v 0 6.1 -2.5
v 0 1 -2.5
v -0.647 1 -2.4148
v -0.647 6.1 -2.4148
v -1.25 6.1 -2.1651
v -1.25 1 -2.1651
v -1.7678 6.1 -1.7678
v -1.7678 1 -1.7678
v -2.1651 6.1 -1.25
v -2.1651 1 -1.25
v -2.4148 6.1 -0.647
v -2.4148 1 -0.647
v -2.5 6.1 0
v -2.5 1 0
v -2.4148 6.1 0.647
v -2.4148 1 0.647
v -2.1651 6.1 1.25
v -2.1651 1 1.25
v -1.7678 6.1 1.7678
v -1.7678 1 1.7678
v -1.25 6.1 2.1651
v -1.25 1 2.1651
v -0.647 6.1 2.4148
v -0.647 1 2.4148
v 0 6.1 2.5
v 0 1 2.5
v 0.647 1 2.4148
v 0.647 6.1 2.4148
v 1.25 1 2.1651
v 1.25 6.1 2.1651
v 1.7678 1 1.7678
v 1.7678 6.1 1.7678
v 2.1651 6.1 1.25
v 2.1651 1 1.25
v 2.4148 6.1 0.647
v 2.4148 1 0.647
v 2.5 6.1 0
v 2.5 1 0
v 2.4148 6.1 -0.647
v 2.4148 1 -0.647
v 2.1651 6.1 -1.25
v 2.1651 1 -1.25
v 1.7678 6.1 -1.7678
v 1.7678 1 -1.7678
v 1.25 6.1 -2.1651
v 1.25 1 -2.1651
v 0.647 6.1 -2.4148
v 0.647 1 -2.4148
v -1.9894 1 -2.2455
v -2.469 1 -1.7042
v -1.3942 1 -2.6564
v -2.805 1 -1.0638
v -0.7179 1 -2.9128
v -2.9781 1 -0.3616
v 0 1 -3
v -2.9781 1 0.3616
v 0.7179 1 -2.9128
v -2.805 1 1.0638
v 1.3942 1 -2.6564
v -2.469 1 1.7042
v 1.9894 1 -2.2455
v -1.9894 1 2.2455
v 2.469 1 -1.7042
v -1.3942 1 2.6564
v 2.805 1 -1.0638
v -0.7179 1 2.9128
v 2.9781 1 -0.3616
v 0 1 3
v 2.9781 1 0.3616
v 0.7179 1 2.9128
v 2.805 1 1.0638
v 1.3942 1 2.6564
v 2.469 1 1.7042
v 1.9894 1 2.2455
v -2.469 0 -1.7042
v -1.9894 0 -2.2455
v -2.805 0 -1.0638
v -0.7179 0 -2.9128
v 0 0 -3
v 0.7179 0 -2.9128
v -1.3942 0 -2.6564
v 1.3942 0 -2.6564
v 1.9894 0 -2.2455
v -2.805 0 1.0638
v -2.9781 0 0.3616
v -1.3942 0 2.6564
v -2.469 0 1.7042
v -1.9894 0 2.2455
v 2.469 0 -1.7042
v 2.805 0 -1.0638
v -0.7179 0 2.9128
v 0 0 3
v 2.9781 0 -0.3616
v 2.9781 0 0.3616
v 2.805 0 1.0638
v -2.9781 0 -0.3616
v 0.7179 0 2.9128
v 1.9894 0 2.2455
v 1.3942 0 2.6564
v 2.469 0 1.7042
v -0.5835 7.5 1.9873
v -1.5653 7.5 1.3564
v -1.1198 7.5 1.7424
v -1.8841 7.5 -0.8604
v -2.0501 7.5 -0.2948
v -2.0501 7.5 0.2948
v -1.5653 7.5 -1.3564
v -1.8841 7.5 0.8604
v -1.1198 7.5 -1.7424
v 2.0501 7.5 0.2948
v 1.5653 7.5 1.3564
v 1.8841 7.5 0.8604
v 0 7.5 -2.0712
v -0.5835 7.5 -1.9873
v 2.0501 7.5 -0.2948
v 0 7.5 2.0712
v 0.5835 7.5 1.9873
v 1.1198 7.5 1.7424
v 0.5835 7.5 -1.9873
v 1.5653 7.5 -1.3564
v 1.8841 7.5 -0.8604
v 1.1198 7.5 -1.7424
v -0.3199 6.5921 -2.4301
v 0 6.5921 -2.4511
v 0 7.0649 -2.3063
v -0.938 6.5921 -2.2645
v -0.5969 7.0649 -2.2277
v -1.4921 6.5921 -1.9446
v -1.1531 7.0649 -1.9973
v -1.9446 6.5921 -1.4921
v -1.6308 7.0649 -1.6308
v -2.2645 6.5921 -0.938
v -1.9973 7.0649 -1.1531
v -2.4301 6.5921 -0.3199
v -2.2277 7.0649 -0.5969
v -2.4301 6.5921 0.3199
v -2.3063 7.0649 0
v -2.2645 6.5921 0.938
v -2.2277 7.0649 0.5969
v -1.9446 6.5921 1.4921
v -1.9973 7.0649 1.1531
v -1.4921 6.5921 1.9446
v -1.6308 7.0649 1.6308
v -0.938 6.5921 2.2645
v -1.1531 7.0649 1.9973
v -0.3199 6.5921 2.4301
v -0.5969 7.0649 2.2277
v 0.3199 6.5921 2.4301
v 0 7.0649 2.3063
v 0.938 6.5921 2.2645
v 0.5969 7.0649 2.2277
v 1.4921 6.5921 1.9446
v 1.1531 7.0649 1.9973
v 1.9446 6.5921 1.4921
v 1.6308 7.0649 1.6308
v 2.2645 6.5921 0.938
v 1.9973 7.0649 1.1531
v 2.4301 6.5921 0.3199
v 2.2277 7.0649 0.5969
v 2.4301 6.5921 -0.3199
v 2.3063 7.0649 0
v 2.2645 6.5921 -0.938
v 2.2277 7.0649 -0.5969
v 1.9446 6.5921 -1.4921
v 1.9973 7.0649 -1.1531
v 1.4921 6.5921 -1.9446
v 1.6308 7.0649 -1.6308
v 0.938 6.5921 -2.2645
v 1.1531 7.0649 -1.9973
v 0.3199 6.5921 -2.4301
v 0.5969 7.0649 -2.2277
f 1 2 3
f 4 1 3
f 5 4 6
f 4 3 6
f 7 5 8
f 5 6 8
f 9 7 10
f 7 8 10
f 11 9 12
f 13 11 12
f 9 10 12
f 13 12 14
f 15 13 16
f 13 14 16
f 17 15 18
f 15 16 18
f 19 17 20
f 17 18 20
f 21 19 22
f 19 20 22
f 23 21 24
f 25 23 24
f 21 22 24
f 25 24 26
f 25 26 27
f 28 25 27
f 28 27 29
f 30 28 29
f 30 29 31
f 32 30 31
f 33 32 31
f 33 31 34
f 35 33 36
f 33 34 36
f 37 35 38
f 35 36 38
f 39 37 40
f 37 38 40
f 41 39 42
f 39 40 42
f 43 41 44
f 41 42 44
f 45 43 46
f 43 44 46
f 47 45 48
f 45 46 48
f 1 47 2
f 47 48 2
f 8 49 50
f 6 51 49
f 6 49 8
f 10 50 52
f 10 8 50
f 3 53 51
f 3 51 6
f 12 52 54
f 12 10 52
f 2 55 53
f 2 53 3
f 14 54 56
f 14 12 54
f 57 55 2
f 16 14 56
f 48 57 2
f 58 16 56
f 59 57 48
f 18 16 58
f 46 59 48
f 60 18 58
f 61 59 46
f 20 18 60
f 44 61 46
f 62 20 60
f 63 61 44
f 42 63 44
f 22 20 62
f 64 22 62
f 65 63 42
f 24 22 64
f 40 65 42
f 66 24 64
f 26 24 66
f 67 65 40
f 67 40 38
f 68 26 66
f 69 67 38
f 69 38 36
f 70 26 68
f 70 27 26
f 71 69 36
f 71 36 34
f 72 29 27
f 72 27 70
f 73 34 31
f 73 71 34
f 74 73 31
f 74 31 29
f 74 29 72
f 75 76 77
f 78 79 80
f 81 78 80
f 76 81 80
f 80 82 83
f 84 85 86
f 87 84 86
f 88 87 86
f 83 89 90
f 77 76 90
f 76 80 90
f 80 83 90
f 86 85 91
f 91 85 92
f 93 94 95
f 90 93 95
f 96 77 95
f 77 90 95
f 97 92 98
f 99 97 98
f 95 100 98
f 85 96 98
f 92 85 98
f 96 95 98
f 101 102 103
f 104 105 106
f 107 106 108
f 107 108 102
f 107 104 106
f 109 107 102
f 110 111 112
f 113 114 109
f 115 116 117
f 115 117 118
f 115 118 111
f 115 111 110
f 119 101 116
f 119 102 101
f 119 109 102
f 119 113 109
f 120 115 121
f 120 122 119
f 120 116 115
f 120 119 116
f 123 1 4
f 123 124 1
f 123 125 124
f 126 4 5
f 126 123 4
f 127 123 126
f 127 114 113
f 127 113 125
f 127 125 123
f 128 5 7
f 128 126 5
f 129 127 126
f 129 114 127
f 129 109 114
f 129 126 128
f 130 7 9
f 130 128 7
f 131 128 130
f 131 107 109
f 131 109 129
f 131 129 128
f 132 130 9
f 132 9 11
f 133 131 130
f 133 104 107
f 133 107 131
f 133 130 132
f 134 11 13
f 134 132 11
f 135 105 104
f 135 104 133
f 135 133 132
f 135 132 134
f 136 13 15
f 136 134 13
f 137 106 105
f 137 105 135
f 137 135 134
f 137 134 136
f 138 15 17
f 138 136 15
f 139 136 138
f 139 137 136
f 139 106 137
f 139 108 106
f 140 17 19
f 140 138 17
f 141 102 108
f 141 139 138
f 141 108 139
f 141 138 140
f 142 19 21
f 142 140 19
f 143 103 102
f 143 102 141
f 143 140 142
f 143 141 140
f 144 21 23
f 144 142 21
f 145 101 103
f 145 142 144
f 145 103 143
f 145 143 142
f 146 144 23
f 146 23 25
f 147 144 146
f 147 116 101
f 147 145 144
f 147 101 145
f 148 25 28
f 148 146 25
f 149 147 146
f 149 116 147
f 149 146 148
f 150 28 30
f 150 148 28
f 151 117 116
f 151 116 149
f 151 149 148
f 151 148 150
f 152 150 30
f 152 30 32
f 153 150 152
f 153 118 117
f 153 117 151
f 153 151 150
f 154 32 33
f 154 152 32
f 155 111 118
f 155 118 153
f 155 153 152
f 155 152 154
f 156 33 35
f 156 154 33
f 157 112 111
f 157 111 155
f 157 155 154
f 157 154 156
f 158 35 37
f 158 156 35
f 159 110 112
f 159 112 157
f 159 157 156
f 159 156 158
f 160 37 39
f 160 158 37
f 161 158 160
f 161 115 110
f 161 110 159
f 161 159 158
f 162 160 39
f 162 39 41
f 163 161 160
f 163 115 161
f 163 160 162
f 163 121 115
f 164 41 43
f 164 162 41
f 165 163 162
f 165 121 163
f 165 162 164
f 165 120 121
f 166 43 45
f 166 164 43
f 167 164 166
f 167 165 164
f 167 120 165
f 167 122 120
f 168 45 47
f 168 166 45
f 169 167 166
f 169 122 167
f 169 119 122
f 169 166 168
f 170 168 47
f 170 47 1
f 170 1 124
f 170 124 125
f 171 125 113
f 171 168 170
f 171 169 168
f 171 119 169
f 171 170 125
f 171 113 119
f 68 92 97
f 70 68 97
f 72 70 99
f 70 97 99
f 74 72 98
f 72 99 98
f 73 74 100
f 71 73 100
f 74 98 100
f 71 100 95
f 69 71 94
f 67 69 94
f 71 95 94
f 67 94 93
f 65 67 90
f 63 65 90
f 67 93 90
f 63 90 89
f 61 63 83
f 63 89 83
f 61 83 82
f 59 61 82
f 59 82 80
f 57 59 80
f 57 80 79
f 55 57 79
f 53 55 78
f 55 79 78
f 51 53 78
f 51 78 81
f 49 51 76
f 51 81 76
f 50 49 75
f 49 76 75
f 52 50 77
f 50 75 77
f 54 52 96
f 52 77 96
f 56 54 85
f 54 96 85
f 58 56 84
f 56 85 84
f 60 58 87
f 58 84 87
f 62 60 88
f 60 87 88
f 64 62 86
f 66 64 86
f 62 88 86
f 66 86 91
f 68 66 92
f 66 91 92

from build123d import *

# Parameters (mm, degrees)
SKETCH_1_R          = 3
EXTRUDE_1_DEPTH     = 1
SKETCH_2_R          = 2.5
EXTRUDE_2_DEPTH     = 7.6
FILLET_1_R          = 2.5
SKETCH_4_R          = 2.556662668
CUT_EXTRUDE_1_DEPTH = 1.1


with BuildPart() as part:
    # Эскиз1 → Бобышка-Вытянуть1 (new body)
    with BuildSketch(Plane(origin=(0, 0, 0), x_dir=(1, 0, 0), z_dir=(0, 1, 0))):
        with Locations(Location((0, 0, 0), (0, 0, 270))):
            Circle(SKETCH_1_R)
    extrude(amount=EXTRUDE_1_DEPTH)

    # Эскиз2 → Бобышка-Вытянуть2 (add)
    with BuildSketch(Plane(origin=(0, 1, 0), x_dir=(1, 0, 0), z_dir=(0, 1, 0))):
        with Locations(Location((0, 0, 0), (0, 0, 90))):
            Circle(SKETCH_2_R)
    extrude(amount=EXTRUDE_2_DEPTH)

    # Скругление1
    fillet_1_edges = [part.edges().sort_by_distance(p)[0] for p in [
        (0, 8.6, 2.5),
    ]]
    fillet(fillet_1_edges, radius=FILLET_1_R)

    # Эскиз4 → Вырез-Вытянуть1 (cut)
    with BuildSketch(Plane(origin=(0, 8.6, 0), x_dir=(1, 0, 0), z_dir=(0, 1, 0))):
        Circle(SKETCH_4_R)
    extrude(amount=-CUT_EXTRUDE_1_DEPTH, mode=Mode.SUBTRACT)


solid = part.part
